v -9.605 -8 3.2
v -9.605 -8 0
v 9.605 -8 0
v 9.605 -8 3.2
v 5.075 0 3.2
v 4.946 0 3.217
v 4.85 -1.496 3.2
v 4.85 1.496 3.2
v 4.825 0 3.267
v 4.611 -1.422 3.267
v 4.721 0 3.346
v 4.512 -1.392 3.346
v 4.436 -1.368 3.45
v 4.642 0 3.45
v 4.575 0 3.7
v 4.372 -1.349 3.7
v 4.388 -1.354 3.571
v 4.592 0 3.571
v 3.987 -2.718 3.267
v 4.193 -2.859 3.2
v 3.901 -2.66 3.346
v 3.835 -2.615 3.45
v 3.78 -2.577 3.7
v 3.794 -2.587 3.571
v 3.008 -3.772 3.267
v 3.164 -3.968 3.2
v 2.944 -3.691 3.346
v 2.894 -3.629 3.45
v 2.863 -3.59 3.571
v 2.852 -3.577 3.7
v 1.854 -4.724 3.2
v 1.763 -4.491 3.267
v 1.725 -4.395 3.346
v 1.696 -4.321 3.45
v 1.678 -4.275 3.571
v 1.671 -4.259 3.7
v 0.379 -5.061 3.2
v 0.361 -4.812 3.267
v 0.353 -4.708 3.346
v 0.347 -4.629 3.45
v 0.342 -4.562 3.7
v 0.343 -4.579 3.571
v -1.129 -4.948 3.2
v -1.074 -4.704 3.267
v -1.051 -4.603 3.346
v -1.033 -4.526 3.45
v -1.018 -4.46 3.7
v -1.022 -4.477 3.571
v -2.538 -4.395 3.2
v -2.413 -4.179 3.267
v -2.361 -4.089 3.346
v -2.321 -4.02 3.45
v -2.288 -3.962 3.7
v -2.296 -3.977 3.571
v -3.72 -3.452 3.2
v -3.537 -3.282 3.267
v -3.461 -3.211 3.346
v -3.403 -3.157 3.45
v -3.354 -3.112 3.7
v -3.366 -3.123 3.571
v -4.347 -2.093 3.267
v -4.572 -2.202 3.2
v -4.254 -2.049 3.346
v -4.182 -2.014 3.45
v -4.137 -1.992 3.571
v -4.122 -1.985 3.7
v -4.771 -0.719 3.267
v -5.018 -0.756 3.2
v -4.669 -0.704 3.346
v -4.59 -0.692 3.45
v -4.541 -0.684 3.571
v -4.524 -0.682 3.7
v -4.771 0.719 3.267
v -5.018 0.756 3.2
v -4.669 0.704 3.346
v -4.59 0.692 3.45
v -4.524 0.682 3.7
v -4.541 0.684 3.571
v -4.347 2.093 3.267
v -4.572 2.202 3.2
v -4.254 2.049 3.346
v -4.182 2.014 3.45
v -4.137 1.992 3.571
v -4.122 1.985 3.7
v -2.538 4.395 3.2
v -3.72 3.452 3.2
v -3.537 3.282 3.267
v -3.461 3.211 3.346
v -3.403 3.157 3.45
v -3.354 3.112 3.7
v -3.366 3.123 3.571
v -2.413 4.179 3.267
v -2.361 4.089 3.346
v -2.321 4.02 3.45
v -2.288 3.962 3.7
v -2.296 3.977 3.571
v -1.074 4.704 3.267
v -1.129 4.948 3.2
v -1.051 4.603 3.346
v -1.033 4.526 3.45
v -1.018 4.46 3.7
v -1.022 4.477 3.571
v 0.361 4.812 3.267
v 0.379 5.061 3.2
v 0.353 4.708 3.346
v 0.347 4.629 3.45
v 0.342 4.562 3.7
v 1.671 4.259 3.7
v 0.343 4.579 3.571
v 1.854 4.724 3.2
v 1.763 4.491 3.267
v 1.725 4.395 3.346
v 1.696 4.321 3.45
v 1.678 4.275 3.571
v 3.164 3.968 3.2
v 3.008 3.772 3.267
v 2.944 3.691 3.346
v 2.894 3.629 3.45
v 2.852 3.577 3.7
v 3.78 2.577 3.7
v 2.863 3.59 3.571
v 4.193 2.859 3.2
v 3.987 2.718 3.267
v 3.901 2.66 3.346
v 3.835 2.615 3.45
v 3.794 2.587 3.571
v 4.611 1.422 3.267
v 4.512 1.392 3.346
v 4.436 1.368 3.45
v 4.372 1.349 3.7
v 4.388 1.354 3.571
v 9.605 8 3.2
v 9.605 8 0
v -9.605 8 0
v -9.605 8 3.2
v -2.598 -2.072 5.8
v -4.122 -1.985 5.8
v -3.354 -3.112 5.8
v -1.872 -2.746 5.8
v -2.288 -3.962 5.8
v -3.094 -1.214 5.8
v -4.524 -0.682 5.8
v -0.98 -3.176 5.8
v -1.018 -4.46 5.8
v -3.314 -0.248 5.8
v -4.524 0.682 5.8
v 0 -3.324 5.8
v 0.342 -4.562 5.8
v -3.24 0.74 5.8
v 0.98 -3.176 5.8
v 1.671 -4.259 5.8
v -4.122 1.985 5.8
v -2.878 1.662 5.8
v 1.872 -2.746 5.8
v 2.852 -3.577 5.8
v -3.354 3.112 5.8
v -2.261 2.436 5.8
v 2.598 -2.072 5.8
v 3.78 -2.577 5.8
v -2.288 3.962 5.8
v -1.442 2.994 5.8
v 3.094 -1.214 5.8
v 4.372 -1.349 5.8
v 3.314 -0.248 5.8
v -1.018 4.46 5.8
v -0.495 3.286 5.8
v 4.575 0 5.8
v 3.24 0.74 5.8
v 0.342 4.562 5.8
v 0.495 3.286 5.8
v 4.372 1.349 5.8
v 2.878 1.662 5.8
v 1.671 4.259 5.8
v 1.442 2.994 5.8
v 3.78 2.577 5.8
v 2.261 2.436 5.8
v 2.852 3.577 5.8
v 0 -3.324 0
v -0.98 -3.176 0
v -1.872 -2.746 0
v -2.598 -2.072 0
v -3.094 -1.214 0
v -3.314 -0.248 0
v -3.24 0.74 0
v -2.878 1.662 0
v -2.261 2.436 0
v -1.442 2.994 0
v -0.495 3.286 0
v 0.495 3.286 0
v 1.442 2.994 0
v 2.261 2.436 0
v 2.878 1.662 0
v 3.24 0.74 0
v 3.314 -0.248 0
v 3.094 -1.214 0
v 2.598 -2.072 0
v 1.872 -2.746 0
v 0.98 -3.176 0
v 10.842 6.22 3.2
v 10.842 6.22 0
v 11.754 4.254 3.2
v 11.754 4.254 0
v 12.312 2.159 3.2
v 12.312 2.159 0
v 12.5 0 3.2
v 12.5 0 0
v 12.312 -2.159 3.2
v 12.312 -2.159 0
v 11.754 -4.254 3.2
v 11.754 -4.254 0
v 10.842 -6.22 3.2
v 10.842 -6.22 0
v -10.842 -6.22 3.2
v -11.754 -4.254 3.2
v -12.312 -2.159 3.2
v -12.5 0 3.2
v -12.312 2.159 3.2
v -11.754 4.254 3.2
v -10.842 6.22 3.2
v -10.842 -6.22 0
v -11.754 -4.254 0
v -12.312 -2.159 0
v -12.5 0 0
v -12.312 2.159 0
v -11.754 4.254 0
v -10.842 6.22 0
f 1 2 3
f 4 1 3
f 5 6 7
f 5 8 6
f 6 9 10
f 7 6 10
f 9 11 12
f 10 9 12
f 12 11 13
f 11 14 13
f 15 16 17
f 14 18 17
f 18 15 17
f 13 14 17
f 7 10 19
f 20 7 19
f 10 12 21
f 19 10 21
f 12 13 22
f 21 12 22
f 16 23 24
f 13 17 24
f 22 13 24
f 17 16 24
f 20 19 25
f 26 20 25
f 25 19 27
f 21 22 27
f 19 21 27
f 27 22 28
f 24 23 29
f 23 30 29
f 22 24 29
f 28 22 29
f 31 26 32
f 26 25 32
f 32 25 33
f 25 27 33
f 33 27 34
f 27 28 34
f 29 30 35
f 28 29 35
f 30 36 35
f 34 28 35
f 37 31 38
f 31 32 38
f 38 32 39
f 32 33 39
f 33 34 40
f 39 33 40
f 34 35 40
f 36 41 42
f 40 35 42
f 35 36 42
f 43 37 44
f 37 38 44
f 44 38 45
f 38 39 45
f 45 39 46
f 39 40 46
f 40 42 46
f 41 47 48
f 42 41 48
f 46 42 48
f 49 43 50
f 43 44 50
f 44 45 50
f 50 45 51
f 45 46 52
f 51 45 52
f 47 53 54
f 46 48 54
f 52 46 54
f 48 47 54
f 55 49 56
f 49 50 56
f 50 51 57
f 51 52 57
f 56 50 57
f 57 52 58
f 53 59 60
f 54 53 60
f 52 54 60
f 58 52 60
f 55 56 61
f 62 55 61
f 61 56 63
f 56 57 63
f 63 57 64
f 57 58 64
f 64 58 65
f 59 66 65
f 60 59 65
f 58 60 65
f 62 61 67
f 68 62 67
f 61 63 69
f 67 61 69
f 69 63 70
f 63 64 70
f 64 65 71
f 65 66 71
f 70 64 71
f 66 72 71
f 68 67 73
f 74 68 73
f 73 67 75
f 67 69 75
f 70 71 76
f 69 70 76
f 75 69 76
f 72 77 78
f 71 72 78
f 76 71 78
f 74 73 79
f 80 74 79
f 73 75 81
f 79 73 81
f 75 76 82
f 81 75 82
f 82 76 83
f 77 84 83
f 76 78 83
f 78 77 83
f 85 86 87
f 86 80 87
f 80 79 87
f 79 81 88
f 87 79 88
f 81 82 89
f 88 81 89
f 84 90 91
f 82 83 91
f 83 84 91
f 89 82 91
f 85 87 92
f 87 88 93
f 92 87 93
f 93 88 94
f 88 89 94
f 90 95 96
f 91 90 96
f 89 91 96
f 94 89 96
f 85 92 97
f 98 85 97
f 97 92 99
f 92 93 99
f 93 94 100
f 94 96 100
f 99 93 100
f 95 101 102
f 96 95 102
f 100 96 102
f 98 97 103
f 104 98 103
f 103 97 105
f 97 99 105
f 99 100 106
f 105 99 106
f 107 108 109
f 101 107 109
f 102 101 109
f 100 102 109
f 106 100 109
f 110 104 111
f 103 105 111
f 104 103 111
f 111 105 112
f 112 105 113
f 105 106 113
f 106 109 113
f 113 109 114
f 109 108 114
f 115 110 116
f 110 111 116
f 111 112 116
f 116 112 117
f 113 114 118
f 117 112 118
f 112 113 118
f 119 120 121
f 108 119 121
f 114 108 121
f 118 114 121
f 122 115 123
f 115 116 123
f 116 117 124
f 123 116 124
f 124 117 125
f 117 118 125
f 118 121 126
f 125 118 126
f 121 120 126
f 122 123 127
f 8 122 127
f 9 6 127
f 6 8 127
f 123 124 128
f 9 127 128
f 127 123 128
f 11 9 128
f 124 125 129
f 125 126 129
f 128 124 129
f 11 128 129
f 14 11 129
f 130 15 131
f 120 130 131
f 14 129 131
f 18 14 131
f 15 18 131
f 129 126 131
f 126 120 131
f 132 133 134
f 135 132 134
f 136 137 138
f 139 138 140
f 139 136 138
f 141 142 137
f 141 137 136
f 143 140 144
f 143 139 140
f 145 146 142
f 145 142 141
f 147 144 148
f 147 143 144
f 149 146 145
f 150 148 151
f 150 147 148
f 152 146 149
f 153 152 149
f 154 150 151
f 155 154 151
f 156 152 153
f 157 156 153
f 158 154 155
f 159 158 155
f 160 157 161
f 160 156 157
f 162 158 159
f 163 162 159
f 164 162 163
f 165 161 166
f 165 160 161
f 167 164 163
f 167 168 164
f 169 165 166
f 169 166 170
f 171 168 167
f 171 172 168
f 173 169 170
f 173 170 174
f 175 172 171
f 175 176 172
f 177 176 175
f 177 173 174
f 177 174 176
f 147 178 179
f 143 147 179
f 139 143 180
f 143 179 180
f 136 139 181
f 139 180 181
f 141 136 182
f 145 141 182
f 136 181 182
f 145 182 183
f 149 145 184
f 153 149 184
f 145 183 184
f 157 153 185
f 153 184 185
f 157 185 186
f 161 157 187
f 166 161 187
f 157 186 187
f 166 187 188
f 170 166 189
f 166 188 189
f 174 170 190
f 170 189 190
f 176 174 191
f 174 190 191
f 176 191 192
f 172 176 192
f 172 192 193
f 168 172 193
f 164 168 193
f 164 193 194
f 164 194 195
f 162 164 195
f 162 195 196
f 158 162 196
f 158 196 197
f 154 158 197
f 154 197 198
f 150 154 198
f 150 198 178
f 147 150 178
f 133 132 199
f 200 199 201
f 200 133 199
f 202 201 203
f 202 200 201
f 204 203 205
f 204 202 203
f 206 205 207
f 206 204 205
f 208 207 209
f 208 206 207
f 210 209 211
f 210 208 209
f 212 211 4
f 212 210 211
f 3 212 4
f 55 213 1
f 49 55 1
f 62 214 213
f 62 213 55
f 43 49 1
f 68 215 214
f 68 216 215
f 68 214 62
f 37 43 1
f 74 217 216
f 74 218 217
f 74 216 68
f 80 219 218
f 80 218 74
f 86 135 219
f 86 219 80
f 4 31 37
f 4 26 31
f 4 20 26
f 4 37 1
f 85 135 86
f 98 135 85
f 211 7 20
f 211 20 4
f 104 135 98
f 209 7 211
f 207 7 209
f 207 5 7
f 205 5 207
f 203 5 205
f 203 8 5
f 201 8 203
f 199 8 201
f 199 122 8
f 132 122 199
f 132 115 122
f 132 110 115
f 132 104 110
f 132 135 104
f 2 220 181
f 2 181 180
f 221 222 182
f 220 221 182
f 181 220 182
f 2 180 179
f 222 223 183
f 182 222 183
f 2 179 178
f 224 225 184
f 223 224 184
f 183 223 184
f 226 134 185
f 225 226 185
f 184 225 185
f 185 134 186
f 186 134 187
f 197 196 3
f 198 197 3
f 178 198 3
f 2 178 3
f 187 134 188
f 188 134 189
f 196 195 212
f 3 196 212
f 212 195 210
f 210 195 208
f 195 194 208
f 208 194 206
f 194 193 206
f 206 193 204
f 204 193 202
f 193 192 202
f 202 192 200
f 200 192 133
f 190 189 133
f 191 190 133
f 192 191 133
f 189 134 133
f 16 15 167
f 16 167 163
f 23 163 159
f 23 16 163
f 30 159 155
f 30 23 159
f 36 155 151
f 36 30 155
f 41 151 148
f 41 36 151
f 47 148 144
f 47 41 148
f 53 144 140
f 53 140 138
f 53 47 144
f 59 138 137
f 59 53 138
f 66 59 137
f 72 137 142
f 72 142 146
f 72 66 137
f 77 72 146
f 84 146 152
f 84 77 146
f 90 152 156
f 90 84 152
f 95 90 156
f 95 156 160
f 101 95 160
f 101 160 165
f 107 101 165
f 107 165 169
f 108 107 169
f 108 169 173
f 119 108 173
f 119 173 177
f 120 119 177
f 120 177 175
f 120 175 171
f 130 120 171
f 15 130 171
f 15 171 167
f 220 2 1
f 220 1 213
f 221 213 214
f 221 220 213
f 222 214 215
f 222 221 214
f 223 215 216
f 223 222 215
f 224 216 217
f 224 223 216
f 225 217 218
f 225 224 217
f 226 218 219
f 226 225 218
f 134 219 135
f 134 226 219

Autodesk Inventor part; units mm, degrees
ref_plane "YZ Plane" through (0, 0, 0) normal (1, 0, 0) x (0, 1, 0)
ref_plane "XY Plane" through (0, 0, 0) normal (0, 0, 1) x (1, 0, 0)
sketch "Sketch1" plane through (0, 0, 0) normal (0, 0, 1) x (1, 0, 0)
  line L0 (-9.6047, -8) -> (9.6047, -8)
  line L1 (9.6047, 8) -> (-9.6047, 8)
  line L2 (0, 11.2) -> (0, -11.2) projected
  line L3 (-17.5, 0) -> (17.5, 0) projected
  arc A0 (-9.6047, 8) -> (-9.6047, -8) centre (0, 0) ccw
  arc A1 (9.6047, -8) -> (9.6047, 8) centre (0, 0) ccw
  point P0 (0, 0)
  point P1 (0, -8)
  point P2 (12.5, 0)
  point P3 (-12.5, 0)
  dimension "d0" = 16
  dimension "d15" = 12.5
  dimension "d16" = 12.5
  dimension "d17" = 25
  dimension "d19" = 8
extrude "Extrusion1" add sketch "Sketch1" along normal blind 3.2
sketch "Sketch2" plane through (0, 0, 3.2) normal (0, 0, 1) x (1, 0, 0)
  line L0 (0, 11.2) -> (0, -11.2) projected
  line L1 (-17.5, 0) -> (17.5, 0) projected
  circle A0 centre (0, 0) radius 4.575
  dimension "d4" = 9.15
extrude "Extrusion2" add sketch "Sketch2" along normal blind 2.6
sketch "Sketch3" plane through (0, 0, 5.8) normal (0, 0, 1) x (1, 0, 0)
  circle A0 centre (0, 0) radius 4.575 projected
hole "Hole1" at (0, 0, 5.8) direction (0, 0, -1) diameter 6.647 end through all thread size "M8x1.25" class "6H" standard "ANSI Metric M Profile"
fillet "Fillet1" radius 0.5 1 edges at (-4.575, 0, 3.2)
properties part number "20-081" material "Steel, Mild"
